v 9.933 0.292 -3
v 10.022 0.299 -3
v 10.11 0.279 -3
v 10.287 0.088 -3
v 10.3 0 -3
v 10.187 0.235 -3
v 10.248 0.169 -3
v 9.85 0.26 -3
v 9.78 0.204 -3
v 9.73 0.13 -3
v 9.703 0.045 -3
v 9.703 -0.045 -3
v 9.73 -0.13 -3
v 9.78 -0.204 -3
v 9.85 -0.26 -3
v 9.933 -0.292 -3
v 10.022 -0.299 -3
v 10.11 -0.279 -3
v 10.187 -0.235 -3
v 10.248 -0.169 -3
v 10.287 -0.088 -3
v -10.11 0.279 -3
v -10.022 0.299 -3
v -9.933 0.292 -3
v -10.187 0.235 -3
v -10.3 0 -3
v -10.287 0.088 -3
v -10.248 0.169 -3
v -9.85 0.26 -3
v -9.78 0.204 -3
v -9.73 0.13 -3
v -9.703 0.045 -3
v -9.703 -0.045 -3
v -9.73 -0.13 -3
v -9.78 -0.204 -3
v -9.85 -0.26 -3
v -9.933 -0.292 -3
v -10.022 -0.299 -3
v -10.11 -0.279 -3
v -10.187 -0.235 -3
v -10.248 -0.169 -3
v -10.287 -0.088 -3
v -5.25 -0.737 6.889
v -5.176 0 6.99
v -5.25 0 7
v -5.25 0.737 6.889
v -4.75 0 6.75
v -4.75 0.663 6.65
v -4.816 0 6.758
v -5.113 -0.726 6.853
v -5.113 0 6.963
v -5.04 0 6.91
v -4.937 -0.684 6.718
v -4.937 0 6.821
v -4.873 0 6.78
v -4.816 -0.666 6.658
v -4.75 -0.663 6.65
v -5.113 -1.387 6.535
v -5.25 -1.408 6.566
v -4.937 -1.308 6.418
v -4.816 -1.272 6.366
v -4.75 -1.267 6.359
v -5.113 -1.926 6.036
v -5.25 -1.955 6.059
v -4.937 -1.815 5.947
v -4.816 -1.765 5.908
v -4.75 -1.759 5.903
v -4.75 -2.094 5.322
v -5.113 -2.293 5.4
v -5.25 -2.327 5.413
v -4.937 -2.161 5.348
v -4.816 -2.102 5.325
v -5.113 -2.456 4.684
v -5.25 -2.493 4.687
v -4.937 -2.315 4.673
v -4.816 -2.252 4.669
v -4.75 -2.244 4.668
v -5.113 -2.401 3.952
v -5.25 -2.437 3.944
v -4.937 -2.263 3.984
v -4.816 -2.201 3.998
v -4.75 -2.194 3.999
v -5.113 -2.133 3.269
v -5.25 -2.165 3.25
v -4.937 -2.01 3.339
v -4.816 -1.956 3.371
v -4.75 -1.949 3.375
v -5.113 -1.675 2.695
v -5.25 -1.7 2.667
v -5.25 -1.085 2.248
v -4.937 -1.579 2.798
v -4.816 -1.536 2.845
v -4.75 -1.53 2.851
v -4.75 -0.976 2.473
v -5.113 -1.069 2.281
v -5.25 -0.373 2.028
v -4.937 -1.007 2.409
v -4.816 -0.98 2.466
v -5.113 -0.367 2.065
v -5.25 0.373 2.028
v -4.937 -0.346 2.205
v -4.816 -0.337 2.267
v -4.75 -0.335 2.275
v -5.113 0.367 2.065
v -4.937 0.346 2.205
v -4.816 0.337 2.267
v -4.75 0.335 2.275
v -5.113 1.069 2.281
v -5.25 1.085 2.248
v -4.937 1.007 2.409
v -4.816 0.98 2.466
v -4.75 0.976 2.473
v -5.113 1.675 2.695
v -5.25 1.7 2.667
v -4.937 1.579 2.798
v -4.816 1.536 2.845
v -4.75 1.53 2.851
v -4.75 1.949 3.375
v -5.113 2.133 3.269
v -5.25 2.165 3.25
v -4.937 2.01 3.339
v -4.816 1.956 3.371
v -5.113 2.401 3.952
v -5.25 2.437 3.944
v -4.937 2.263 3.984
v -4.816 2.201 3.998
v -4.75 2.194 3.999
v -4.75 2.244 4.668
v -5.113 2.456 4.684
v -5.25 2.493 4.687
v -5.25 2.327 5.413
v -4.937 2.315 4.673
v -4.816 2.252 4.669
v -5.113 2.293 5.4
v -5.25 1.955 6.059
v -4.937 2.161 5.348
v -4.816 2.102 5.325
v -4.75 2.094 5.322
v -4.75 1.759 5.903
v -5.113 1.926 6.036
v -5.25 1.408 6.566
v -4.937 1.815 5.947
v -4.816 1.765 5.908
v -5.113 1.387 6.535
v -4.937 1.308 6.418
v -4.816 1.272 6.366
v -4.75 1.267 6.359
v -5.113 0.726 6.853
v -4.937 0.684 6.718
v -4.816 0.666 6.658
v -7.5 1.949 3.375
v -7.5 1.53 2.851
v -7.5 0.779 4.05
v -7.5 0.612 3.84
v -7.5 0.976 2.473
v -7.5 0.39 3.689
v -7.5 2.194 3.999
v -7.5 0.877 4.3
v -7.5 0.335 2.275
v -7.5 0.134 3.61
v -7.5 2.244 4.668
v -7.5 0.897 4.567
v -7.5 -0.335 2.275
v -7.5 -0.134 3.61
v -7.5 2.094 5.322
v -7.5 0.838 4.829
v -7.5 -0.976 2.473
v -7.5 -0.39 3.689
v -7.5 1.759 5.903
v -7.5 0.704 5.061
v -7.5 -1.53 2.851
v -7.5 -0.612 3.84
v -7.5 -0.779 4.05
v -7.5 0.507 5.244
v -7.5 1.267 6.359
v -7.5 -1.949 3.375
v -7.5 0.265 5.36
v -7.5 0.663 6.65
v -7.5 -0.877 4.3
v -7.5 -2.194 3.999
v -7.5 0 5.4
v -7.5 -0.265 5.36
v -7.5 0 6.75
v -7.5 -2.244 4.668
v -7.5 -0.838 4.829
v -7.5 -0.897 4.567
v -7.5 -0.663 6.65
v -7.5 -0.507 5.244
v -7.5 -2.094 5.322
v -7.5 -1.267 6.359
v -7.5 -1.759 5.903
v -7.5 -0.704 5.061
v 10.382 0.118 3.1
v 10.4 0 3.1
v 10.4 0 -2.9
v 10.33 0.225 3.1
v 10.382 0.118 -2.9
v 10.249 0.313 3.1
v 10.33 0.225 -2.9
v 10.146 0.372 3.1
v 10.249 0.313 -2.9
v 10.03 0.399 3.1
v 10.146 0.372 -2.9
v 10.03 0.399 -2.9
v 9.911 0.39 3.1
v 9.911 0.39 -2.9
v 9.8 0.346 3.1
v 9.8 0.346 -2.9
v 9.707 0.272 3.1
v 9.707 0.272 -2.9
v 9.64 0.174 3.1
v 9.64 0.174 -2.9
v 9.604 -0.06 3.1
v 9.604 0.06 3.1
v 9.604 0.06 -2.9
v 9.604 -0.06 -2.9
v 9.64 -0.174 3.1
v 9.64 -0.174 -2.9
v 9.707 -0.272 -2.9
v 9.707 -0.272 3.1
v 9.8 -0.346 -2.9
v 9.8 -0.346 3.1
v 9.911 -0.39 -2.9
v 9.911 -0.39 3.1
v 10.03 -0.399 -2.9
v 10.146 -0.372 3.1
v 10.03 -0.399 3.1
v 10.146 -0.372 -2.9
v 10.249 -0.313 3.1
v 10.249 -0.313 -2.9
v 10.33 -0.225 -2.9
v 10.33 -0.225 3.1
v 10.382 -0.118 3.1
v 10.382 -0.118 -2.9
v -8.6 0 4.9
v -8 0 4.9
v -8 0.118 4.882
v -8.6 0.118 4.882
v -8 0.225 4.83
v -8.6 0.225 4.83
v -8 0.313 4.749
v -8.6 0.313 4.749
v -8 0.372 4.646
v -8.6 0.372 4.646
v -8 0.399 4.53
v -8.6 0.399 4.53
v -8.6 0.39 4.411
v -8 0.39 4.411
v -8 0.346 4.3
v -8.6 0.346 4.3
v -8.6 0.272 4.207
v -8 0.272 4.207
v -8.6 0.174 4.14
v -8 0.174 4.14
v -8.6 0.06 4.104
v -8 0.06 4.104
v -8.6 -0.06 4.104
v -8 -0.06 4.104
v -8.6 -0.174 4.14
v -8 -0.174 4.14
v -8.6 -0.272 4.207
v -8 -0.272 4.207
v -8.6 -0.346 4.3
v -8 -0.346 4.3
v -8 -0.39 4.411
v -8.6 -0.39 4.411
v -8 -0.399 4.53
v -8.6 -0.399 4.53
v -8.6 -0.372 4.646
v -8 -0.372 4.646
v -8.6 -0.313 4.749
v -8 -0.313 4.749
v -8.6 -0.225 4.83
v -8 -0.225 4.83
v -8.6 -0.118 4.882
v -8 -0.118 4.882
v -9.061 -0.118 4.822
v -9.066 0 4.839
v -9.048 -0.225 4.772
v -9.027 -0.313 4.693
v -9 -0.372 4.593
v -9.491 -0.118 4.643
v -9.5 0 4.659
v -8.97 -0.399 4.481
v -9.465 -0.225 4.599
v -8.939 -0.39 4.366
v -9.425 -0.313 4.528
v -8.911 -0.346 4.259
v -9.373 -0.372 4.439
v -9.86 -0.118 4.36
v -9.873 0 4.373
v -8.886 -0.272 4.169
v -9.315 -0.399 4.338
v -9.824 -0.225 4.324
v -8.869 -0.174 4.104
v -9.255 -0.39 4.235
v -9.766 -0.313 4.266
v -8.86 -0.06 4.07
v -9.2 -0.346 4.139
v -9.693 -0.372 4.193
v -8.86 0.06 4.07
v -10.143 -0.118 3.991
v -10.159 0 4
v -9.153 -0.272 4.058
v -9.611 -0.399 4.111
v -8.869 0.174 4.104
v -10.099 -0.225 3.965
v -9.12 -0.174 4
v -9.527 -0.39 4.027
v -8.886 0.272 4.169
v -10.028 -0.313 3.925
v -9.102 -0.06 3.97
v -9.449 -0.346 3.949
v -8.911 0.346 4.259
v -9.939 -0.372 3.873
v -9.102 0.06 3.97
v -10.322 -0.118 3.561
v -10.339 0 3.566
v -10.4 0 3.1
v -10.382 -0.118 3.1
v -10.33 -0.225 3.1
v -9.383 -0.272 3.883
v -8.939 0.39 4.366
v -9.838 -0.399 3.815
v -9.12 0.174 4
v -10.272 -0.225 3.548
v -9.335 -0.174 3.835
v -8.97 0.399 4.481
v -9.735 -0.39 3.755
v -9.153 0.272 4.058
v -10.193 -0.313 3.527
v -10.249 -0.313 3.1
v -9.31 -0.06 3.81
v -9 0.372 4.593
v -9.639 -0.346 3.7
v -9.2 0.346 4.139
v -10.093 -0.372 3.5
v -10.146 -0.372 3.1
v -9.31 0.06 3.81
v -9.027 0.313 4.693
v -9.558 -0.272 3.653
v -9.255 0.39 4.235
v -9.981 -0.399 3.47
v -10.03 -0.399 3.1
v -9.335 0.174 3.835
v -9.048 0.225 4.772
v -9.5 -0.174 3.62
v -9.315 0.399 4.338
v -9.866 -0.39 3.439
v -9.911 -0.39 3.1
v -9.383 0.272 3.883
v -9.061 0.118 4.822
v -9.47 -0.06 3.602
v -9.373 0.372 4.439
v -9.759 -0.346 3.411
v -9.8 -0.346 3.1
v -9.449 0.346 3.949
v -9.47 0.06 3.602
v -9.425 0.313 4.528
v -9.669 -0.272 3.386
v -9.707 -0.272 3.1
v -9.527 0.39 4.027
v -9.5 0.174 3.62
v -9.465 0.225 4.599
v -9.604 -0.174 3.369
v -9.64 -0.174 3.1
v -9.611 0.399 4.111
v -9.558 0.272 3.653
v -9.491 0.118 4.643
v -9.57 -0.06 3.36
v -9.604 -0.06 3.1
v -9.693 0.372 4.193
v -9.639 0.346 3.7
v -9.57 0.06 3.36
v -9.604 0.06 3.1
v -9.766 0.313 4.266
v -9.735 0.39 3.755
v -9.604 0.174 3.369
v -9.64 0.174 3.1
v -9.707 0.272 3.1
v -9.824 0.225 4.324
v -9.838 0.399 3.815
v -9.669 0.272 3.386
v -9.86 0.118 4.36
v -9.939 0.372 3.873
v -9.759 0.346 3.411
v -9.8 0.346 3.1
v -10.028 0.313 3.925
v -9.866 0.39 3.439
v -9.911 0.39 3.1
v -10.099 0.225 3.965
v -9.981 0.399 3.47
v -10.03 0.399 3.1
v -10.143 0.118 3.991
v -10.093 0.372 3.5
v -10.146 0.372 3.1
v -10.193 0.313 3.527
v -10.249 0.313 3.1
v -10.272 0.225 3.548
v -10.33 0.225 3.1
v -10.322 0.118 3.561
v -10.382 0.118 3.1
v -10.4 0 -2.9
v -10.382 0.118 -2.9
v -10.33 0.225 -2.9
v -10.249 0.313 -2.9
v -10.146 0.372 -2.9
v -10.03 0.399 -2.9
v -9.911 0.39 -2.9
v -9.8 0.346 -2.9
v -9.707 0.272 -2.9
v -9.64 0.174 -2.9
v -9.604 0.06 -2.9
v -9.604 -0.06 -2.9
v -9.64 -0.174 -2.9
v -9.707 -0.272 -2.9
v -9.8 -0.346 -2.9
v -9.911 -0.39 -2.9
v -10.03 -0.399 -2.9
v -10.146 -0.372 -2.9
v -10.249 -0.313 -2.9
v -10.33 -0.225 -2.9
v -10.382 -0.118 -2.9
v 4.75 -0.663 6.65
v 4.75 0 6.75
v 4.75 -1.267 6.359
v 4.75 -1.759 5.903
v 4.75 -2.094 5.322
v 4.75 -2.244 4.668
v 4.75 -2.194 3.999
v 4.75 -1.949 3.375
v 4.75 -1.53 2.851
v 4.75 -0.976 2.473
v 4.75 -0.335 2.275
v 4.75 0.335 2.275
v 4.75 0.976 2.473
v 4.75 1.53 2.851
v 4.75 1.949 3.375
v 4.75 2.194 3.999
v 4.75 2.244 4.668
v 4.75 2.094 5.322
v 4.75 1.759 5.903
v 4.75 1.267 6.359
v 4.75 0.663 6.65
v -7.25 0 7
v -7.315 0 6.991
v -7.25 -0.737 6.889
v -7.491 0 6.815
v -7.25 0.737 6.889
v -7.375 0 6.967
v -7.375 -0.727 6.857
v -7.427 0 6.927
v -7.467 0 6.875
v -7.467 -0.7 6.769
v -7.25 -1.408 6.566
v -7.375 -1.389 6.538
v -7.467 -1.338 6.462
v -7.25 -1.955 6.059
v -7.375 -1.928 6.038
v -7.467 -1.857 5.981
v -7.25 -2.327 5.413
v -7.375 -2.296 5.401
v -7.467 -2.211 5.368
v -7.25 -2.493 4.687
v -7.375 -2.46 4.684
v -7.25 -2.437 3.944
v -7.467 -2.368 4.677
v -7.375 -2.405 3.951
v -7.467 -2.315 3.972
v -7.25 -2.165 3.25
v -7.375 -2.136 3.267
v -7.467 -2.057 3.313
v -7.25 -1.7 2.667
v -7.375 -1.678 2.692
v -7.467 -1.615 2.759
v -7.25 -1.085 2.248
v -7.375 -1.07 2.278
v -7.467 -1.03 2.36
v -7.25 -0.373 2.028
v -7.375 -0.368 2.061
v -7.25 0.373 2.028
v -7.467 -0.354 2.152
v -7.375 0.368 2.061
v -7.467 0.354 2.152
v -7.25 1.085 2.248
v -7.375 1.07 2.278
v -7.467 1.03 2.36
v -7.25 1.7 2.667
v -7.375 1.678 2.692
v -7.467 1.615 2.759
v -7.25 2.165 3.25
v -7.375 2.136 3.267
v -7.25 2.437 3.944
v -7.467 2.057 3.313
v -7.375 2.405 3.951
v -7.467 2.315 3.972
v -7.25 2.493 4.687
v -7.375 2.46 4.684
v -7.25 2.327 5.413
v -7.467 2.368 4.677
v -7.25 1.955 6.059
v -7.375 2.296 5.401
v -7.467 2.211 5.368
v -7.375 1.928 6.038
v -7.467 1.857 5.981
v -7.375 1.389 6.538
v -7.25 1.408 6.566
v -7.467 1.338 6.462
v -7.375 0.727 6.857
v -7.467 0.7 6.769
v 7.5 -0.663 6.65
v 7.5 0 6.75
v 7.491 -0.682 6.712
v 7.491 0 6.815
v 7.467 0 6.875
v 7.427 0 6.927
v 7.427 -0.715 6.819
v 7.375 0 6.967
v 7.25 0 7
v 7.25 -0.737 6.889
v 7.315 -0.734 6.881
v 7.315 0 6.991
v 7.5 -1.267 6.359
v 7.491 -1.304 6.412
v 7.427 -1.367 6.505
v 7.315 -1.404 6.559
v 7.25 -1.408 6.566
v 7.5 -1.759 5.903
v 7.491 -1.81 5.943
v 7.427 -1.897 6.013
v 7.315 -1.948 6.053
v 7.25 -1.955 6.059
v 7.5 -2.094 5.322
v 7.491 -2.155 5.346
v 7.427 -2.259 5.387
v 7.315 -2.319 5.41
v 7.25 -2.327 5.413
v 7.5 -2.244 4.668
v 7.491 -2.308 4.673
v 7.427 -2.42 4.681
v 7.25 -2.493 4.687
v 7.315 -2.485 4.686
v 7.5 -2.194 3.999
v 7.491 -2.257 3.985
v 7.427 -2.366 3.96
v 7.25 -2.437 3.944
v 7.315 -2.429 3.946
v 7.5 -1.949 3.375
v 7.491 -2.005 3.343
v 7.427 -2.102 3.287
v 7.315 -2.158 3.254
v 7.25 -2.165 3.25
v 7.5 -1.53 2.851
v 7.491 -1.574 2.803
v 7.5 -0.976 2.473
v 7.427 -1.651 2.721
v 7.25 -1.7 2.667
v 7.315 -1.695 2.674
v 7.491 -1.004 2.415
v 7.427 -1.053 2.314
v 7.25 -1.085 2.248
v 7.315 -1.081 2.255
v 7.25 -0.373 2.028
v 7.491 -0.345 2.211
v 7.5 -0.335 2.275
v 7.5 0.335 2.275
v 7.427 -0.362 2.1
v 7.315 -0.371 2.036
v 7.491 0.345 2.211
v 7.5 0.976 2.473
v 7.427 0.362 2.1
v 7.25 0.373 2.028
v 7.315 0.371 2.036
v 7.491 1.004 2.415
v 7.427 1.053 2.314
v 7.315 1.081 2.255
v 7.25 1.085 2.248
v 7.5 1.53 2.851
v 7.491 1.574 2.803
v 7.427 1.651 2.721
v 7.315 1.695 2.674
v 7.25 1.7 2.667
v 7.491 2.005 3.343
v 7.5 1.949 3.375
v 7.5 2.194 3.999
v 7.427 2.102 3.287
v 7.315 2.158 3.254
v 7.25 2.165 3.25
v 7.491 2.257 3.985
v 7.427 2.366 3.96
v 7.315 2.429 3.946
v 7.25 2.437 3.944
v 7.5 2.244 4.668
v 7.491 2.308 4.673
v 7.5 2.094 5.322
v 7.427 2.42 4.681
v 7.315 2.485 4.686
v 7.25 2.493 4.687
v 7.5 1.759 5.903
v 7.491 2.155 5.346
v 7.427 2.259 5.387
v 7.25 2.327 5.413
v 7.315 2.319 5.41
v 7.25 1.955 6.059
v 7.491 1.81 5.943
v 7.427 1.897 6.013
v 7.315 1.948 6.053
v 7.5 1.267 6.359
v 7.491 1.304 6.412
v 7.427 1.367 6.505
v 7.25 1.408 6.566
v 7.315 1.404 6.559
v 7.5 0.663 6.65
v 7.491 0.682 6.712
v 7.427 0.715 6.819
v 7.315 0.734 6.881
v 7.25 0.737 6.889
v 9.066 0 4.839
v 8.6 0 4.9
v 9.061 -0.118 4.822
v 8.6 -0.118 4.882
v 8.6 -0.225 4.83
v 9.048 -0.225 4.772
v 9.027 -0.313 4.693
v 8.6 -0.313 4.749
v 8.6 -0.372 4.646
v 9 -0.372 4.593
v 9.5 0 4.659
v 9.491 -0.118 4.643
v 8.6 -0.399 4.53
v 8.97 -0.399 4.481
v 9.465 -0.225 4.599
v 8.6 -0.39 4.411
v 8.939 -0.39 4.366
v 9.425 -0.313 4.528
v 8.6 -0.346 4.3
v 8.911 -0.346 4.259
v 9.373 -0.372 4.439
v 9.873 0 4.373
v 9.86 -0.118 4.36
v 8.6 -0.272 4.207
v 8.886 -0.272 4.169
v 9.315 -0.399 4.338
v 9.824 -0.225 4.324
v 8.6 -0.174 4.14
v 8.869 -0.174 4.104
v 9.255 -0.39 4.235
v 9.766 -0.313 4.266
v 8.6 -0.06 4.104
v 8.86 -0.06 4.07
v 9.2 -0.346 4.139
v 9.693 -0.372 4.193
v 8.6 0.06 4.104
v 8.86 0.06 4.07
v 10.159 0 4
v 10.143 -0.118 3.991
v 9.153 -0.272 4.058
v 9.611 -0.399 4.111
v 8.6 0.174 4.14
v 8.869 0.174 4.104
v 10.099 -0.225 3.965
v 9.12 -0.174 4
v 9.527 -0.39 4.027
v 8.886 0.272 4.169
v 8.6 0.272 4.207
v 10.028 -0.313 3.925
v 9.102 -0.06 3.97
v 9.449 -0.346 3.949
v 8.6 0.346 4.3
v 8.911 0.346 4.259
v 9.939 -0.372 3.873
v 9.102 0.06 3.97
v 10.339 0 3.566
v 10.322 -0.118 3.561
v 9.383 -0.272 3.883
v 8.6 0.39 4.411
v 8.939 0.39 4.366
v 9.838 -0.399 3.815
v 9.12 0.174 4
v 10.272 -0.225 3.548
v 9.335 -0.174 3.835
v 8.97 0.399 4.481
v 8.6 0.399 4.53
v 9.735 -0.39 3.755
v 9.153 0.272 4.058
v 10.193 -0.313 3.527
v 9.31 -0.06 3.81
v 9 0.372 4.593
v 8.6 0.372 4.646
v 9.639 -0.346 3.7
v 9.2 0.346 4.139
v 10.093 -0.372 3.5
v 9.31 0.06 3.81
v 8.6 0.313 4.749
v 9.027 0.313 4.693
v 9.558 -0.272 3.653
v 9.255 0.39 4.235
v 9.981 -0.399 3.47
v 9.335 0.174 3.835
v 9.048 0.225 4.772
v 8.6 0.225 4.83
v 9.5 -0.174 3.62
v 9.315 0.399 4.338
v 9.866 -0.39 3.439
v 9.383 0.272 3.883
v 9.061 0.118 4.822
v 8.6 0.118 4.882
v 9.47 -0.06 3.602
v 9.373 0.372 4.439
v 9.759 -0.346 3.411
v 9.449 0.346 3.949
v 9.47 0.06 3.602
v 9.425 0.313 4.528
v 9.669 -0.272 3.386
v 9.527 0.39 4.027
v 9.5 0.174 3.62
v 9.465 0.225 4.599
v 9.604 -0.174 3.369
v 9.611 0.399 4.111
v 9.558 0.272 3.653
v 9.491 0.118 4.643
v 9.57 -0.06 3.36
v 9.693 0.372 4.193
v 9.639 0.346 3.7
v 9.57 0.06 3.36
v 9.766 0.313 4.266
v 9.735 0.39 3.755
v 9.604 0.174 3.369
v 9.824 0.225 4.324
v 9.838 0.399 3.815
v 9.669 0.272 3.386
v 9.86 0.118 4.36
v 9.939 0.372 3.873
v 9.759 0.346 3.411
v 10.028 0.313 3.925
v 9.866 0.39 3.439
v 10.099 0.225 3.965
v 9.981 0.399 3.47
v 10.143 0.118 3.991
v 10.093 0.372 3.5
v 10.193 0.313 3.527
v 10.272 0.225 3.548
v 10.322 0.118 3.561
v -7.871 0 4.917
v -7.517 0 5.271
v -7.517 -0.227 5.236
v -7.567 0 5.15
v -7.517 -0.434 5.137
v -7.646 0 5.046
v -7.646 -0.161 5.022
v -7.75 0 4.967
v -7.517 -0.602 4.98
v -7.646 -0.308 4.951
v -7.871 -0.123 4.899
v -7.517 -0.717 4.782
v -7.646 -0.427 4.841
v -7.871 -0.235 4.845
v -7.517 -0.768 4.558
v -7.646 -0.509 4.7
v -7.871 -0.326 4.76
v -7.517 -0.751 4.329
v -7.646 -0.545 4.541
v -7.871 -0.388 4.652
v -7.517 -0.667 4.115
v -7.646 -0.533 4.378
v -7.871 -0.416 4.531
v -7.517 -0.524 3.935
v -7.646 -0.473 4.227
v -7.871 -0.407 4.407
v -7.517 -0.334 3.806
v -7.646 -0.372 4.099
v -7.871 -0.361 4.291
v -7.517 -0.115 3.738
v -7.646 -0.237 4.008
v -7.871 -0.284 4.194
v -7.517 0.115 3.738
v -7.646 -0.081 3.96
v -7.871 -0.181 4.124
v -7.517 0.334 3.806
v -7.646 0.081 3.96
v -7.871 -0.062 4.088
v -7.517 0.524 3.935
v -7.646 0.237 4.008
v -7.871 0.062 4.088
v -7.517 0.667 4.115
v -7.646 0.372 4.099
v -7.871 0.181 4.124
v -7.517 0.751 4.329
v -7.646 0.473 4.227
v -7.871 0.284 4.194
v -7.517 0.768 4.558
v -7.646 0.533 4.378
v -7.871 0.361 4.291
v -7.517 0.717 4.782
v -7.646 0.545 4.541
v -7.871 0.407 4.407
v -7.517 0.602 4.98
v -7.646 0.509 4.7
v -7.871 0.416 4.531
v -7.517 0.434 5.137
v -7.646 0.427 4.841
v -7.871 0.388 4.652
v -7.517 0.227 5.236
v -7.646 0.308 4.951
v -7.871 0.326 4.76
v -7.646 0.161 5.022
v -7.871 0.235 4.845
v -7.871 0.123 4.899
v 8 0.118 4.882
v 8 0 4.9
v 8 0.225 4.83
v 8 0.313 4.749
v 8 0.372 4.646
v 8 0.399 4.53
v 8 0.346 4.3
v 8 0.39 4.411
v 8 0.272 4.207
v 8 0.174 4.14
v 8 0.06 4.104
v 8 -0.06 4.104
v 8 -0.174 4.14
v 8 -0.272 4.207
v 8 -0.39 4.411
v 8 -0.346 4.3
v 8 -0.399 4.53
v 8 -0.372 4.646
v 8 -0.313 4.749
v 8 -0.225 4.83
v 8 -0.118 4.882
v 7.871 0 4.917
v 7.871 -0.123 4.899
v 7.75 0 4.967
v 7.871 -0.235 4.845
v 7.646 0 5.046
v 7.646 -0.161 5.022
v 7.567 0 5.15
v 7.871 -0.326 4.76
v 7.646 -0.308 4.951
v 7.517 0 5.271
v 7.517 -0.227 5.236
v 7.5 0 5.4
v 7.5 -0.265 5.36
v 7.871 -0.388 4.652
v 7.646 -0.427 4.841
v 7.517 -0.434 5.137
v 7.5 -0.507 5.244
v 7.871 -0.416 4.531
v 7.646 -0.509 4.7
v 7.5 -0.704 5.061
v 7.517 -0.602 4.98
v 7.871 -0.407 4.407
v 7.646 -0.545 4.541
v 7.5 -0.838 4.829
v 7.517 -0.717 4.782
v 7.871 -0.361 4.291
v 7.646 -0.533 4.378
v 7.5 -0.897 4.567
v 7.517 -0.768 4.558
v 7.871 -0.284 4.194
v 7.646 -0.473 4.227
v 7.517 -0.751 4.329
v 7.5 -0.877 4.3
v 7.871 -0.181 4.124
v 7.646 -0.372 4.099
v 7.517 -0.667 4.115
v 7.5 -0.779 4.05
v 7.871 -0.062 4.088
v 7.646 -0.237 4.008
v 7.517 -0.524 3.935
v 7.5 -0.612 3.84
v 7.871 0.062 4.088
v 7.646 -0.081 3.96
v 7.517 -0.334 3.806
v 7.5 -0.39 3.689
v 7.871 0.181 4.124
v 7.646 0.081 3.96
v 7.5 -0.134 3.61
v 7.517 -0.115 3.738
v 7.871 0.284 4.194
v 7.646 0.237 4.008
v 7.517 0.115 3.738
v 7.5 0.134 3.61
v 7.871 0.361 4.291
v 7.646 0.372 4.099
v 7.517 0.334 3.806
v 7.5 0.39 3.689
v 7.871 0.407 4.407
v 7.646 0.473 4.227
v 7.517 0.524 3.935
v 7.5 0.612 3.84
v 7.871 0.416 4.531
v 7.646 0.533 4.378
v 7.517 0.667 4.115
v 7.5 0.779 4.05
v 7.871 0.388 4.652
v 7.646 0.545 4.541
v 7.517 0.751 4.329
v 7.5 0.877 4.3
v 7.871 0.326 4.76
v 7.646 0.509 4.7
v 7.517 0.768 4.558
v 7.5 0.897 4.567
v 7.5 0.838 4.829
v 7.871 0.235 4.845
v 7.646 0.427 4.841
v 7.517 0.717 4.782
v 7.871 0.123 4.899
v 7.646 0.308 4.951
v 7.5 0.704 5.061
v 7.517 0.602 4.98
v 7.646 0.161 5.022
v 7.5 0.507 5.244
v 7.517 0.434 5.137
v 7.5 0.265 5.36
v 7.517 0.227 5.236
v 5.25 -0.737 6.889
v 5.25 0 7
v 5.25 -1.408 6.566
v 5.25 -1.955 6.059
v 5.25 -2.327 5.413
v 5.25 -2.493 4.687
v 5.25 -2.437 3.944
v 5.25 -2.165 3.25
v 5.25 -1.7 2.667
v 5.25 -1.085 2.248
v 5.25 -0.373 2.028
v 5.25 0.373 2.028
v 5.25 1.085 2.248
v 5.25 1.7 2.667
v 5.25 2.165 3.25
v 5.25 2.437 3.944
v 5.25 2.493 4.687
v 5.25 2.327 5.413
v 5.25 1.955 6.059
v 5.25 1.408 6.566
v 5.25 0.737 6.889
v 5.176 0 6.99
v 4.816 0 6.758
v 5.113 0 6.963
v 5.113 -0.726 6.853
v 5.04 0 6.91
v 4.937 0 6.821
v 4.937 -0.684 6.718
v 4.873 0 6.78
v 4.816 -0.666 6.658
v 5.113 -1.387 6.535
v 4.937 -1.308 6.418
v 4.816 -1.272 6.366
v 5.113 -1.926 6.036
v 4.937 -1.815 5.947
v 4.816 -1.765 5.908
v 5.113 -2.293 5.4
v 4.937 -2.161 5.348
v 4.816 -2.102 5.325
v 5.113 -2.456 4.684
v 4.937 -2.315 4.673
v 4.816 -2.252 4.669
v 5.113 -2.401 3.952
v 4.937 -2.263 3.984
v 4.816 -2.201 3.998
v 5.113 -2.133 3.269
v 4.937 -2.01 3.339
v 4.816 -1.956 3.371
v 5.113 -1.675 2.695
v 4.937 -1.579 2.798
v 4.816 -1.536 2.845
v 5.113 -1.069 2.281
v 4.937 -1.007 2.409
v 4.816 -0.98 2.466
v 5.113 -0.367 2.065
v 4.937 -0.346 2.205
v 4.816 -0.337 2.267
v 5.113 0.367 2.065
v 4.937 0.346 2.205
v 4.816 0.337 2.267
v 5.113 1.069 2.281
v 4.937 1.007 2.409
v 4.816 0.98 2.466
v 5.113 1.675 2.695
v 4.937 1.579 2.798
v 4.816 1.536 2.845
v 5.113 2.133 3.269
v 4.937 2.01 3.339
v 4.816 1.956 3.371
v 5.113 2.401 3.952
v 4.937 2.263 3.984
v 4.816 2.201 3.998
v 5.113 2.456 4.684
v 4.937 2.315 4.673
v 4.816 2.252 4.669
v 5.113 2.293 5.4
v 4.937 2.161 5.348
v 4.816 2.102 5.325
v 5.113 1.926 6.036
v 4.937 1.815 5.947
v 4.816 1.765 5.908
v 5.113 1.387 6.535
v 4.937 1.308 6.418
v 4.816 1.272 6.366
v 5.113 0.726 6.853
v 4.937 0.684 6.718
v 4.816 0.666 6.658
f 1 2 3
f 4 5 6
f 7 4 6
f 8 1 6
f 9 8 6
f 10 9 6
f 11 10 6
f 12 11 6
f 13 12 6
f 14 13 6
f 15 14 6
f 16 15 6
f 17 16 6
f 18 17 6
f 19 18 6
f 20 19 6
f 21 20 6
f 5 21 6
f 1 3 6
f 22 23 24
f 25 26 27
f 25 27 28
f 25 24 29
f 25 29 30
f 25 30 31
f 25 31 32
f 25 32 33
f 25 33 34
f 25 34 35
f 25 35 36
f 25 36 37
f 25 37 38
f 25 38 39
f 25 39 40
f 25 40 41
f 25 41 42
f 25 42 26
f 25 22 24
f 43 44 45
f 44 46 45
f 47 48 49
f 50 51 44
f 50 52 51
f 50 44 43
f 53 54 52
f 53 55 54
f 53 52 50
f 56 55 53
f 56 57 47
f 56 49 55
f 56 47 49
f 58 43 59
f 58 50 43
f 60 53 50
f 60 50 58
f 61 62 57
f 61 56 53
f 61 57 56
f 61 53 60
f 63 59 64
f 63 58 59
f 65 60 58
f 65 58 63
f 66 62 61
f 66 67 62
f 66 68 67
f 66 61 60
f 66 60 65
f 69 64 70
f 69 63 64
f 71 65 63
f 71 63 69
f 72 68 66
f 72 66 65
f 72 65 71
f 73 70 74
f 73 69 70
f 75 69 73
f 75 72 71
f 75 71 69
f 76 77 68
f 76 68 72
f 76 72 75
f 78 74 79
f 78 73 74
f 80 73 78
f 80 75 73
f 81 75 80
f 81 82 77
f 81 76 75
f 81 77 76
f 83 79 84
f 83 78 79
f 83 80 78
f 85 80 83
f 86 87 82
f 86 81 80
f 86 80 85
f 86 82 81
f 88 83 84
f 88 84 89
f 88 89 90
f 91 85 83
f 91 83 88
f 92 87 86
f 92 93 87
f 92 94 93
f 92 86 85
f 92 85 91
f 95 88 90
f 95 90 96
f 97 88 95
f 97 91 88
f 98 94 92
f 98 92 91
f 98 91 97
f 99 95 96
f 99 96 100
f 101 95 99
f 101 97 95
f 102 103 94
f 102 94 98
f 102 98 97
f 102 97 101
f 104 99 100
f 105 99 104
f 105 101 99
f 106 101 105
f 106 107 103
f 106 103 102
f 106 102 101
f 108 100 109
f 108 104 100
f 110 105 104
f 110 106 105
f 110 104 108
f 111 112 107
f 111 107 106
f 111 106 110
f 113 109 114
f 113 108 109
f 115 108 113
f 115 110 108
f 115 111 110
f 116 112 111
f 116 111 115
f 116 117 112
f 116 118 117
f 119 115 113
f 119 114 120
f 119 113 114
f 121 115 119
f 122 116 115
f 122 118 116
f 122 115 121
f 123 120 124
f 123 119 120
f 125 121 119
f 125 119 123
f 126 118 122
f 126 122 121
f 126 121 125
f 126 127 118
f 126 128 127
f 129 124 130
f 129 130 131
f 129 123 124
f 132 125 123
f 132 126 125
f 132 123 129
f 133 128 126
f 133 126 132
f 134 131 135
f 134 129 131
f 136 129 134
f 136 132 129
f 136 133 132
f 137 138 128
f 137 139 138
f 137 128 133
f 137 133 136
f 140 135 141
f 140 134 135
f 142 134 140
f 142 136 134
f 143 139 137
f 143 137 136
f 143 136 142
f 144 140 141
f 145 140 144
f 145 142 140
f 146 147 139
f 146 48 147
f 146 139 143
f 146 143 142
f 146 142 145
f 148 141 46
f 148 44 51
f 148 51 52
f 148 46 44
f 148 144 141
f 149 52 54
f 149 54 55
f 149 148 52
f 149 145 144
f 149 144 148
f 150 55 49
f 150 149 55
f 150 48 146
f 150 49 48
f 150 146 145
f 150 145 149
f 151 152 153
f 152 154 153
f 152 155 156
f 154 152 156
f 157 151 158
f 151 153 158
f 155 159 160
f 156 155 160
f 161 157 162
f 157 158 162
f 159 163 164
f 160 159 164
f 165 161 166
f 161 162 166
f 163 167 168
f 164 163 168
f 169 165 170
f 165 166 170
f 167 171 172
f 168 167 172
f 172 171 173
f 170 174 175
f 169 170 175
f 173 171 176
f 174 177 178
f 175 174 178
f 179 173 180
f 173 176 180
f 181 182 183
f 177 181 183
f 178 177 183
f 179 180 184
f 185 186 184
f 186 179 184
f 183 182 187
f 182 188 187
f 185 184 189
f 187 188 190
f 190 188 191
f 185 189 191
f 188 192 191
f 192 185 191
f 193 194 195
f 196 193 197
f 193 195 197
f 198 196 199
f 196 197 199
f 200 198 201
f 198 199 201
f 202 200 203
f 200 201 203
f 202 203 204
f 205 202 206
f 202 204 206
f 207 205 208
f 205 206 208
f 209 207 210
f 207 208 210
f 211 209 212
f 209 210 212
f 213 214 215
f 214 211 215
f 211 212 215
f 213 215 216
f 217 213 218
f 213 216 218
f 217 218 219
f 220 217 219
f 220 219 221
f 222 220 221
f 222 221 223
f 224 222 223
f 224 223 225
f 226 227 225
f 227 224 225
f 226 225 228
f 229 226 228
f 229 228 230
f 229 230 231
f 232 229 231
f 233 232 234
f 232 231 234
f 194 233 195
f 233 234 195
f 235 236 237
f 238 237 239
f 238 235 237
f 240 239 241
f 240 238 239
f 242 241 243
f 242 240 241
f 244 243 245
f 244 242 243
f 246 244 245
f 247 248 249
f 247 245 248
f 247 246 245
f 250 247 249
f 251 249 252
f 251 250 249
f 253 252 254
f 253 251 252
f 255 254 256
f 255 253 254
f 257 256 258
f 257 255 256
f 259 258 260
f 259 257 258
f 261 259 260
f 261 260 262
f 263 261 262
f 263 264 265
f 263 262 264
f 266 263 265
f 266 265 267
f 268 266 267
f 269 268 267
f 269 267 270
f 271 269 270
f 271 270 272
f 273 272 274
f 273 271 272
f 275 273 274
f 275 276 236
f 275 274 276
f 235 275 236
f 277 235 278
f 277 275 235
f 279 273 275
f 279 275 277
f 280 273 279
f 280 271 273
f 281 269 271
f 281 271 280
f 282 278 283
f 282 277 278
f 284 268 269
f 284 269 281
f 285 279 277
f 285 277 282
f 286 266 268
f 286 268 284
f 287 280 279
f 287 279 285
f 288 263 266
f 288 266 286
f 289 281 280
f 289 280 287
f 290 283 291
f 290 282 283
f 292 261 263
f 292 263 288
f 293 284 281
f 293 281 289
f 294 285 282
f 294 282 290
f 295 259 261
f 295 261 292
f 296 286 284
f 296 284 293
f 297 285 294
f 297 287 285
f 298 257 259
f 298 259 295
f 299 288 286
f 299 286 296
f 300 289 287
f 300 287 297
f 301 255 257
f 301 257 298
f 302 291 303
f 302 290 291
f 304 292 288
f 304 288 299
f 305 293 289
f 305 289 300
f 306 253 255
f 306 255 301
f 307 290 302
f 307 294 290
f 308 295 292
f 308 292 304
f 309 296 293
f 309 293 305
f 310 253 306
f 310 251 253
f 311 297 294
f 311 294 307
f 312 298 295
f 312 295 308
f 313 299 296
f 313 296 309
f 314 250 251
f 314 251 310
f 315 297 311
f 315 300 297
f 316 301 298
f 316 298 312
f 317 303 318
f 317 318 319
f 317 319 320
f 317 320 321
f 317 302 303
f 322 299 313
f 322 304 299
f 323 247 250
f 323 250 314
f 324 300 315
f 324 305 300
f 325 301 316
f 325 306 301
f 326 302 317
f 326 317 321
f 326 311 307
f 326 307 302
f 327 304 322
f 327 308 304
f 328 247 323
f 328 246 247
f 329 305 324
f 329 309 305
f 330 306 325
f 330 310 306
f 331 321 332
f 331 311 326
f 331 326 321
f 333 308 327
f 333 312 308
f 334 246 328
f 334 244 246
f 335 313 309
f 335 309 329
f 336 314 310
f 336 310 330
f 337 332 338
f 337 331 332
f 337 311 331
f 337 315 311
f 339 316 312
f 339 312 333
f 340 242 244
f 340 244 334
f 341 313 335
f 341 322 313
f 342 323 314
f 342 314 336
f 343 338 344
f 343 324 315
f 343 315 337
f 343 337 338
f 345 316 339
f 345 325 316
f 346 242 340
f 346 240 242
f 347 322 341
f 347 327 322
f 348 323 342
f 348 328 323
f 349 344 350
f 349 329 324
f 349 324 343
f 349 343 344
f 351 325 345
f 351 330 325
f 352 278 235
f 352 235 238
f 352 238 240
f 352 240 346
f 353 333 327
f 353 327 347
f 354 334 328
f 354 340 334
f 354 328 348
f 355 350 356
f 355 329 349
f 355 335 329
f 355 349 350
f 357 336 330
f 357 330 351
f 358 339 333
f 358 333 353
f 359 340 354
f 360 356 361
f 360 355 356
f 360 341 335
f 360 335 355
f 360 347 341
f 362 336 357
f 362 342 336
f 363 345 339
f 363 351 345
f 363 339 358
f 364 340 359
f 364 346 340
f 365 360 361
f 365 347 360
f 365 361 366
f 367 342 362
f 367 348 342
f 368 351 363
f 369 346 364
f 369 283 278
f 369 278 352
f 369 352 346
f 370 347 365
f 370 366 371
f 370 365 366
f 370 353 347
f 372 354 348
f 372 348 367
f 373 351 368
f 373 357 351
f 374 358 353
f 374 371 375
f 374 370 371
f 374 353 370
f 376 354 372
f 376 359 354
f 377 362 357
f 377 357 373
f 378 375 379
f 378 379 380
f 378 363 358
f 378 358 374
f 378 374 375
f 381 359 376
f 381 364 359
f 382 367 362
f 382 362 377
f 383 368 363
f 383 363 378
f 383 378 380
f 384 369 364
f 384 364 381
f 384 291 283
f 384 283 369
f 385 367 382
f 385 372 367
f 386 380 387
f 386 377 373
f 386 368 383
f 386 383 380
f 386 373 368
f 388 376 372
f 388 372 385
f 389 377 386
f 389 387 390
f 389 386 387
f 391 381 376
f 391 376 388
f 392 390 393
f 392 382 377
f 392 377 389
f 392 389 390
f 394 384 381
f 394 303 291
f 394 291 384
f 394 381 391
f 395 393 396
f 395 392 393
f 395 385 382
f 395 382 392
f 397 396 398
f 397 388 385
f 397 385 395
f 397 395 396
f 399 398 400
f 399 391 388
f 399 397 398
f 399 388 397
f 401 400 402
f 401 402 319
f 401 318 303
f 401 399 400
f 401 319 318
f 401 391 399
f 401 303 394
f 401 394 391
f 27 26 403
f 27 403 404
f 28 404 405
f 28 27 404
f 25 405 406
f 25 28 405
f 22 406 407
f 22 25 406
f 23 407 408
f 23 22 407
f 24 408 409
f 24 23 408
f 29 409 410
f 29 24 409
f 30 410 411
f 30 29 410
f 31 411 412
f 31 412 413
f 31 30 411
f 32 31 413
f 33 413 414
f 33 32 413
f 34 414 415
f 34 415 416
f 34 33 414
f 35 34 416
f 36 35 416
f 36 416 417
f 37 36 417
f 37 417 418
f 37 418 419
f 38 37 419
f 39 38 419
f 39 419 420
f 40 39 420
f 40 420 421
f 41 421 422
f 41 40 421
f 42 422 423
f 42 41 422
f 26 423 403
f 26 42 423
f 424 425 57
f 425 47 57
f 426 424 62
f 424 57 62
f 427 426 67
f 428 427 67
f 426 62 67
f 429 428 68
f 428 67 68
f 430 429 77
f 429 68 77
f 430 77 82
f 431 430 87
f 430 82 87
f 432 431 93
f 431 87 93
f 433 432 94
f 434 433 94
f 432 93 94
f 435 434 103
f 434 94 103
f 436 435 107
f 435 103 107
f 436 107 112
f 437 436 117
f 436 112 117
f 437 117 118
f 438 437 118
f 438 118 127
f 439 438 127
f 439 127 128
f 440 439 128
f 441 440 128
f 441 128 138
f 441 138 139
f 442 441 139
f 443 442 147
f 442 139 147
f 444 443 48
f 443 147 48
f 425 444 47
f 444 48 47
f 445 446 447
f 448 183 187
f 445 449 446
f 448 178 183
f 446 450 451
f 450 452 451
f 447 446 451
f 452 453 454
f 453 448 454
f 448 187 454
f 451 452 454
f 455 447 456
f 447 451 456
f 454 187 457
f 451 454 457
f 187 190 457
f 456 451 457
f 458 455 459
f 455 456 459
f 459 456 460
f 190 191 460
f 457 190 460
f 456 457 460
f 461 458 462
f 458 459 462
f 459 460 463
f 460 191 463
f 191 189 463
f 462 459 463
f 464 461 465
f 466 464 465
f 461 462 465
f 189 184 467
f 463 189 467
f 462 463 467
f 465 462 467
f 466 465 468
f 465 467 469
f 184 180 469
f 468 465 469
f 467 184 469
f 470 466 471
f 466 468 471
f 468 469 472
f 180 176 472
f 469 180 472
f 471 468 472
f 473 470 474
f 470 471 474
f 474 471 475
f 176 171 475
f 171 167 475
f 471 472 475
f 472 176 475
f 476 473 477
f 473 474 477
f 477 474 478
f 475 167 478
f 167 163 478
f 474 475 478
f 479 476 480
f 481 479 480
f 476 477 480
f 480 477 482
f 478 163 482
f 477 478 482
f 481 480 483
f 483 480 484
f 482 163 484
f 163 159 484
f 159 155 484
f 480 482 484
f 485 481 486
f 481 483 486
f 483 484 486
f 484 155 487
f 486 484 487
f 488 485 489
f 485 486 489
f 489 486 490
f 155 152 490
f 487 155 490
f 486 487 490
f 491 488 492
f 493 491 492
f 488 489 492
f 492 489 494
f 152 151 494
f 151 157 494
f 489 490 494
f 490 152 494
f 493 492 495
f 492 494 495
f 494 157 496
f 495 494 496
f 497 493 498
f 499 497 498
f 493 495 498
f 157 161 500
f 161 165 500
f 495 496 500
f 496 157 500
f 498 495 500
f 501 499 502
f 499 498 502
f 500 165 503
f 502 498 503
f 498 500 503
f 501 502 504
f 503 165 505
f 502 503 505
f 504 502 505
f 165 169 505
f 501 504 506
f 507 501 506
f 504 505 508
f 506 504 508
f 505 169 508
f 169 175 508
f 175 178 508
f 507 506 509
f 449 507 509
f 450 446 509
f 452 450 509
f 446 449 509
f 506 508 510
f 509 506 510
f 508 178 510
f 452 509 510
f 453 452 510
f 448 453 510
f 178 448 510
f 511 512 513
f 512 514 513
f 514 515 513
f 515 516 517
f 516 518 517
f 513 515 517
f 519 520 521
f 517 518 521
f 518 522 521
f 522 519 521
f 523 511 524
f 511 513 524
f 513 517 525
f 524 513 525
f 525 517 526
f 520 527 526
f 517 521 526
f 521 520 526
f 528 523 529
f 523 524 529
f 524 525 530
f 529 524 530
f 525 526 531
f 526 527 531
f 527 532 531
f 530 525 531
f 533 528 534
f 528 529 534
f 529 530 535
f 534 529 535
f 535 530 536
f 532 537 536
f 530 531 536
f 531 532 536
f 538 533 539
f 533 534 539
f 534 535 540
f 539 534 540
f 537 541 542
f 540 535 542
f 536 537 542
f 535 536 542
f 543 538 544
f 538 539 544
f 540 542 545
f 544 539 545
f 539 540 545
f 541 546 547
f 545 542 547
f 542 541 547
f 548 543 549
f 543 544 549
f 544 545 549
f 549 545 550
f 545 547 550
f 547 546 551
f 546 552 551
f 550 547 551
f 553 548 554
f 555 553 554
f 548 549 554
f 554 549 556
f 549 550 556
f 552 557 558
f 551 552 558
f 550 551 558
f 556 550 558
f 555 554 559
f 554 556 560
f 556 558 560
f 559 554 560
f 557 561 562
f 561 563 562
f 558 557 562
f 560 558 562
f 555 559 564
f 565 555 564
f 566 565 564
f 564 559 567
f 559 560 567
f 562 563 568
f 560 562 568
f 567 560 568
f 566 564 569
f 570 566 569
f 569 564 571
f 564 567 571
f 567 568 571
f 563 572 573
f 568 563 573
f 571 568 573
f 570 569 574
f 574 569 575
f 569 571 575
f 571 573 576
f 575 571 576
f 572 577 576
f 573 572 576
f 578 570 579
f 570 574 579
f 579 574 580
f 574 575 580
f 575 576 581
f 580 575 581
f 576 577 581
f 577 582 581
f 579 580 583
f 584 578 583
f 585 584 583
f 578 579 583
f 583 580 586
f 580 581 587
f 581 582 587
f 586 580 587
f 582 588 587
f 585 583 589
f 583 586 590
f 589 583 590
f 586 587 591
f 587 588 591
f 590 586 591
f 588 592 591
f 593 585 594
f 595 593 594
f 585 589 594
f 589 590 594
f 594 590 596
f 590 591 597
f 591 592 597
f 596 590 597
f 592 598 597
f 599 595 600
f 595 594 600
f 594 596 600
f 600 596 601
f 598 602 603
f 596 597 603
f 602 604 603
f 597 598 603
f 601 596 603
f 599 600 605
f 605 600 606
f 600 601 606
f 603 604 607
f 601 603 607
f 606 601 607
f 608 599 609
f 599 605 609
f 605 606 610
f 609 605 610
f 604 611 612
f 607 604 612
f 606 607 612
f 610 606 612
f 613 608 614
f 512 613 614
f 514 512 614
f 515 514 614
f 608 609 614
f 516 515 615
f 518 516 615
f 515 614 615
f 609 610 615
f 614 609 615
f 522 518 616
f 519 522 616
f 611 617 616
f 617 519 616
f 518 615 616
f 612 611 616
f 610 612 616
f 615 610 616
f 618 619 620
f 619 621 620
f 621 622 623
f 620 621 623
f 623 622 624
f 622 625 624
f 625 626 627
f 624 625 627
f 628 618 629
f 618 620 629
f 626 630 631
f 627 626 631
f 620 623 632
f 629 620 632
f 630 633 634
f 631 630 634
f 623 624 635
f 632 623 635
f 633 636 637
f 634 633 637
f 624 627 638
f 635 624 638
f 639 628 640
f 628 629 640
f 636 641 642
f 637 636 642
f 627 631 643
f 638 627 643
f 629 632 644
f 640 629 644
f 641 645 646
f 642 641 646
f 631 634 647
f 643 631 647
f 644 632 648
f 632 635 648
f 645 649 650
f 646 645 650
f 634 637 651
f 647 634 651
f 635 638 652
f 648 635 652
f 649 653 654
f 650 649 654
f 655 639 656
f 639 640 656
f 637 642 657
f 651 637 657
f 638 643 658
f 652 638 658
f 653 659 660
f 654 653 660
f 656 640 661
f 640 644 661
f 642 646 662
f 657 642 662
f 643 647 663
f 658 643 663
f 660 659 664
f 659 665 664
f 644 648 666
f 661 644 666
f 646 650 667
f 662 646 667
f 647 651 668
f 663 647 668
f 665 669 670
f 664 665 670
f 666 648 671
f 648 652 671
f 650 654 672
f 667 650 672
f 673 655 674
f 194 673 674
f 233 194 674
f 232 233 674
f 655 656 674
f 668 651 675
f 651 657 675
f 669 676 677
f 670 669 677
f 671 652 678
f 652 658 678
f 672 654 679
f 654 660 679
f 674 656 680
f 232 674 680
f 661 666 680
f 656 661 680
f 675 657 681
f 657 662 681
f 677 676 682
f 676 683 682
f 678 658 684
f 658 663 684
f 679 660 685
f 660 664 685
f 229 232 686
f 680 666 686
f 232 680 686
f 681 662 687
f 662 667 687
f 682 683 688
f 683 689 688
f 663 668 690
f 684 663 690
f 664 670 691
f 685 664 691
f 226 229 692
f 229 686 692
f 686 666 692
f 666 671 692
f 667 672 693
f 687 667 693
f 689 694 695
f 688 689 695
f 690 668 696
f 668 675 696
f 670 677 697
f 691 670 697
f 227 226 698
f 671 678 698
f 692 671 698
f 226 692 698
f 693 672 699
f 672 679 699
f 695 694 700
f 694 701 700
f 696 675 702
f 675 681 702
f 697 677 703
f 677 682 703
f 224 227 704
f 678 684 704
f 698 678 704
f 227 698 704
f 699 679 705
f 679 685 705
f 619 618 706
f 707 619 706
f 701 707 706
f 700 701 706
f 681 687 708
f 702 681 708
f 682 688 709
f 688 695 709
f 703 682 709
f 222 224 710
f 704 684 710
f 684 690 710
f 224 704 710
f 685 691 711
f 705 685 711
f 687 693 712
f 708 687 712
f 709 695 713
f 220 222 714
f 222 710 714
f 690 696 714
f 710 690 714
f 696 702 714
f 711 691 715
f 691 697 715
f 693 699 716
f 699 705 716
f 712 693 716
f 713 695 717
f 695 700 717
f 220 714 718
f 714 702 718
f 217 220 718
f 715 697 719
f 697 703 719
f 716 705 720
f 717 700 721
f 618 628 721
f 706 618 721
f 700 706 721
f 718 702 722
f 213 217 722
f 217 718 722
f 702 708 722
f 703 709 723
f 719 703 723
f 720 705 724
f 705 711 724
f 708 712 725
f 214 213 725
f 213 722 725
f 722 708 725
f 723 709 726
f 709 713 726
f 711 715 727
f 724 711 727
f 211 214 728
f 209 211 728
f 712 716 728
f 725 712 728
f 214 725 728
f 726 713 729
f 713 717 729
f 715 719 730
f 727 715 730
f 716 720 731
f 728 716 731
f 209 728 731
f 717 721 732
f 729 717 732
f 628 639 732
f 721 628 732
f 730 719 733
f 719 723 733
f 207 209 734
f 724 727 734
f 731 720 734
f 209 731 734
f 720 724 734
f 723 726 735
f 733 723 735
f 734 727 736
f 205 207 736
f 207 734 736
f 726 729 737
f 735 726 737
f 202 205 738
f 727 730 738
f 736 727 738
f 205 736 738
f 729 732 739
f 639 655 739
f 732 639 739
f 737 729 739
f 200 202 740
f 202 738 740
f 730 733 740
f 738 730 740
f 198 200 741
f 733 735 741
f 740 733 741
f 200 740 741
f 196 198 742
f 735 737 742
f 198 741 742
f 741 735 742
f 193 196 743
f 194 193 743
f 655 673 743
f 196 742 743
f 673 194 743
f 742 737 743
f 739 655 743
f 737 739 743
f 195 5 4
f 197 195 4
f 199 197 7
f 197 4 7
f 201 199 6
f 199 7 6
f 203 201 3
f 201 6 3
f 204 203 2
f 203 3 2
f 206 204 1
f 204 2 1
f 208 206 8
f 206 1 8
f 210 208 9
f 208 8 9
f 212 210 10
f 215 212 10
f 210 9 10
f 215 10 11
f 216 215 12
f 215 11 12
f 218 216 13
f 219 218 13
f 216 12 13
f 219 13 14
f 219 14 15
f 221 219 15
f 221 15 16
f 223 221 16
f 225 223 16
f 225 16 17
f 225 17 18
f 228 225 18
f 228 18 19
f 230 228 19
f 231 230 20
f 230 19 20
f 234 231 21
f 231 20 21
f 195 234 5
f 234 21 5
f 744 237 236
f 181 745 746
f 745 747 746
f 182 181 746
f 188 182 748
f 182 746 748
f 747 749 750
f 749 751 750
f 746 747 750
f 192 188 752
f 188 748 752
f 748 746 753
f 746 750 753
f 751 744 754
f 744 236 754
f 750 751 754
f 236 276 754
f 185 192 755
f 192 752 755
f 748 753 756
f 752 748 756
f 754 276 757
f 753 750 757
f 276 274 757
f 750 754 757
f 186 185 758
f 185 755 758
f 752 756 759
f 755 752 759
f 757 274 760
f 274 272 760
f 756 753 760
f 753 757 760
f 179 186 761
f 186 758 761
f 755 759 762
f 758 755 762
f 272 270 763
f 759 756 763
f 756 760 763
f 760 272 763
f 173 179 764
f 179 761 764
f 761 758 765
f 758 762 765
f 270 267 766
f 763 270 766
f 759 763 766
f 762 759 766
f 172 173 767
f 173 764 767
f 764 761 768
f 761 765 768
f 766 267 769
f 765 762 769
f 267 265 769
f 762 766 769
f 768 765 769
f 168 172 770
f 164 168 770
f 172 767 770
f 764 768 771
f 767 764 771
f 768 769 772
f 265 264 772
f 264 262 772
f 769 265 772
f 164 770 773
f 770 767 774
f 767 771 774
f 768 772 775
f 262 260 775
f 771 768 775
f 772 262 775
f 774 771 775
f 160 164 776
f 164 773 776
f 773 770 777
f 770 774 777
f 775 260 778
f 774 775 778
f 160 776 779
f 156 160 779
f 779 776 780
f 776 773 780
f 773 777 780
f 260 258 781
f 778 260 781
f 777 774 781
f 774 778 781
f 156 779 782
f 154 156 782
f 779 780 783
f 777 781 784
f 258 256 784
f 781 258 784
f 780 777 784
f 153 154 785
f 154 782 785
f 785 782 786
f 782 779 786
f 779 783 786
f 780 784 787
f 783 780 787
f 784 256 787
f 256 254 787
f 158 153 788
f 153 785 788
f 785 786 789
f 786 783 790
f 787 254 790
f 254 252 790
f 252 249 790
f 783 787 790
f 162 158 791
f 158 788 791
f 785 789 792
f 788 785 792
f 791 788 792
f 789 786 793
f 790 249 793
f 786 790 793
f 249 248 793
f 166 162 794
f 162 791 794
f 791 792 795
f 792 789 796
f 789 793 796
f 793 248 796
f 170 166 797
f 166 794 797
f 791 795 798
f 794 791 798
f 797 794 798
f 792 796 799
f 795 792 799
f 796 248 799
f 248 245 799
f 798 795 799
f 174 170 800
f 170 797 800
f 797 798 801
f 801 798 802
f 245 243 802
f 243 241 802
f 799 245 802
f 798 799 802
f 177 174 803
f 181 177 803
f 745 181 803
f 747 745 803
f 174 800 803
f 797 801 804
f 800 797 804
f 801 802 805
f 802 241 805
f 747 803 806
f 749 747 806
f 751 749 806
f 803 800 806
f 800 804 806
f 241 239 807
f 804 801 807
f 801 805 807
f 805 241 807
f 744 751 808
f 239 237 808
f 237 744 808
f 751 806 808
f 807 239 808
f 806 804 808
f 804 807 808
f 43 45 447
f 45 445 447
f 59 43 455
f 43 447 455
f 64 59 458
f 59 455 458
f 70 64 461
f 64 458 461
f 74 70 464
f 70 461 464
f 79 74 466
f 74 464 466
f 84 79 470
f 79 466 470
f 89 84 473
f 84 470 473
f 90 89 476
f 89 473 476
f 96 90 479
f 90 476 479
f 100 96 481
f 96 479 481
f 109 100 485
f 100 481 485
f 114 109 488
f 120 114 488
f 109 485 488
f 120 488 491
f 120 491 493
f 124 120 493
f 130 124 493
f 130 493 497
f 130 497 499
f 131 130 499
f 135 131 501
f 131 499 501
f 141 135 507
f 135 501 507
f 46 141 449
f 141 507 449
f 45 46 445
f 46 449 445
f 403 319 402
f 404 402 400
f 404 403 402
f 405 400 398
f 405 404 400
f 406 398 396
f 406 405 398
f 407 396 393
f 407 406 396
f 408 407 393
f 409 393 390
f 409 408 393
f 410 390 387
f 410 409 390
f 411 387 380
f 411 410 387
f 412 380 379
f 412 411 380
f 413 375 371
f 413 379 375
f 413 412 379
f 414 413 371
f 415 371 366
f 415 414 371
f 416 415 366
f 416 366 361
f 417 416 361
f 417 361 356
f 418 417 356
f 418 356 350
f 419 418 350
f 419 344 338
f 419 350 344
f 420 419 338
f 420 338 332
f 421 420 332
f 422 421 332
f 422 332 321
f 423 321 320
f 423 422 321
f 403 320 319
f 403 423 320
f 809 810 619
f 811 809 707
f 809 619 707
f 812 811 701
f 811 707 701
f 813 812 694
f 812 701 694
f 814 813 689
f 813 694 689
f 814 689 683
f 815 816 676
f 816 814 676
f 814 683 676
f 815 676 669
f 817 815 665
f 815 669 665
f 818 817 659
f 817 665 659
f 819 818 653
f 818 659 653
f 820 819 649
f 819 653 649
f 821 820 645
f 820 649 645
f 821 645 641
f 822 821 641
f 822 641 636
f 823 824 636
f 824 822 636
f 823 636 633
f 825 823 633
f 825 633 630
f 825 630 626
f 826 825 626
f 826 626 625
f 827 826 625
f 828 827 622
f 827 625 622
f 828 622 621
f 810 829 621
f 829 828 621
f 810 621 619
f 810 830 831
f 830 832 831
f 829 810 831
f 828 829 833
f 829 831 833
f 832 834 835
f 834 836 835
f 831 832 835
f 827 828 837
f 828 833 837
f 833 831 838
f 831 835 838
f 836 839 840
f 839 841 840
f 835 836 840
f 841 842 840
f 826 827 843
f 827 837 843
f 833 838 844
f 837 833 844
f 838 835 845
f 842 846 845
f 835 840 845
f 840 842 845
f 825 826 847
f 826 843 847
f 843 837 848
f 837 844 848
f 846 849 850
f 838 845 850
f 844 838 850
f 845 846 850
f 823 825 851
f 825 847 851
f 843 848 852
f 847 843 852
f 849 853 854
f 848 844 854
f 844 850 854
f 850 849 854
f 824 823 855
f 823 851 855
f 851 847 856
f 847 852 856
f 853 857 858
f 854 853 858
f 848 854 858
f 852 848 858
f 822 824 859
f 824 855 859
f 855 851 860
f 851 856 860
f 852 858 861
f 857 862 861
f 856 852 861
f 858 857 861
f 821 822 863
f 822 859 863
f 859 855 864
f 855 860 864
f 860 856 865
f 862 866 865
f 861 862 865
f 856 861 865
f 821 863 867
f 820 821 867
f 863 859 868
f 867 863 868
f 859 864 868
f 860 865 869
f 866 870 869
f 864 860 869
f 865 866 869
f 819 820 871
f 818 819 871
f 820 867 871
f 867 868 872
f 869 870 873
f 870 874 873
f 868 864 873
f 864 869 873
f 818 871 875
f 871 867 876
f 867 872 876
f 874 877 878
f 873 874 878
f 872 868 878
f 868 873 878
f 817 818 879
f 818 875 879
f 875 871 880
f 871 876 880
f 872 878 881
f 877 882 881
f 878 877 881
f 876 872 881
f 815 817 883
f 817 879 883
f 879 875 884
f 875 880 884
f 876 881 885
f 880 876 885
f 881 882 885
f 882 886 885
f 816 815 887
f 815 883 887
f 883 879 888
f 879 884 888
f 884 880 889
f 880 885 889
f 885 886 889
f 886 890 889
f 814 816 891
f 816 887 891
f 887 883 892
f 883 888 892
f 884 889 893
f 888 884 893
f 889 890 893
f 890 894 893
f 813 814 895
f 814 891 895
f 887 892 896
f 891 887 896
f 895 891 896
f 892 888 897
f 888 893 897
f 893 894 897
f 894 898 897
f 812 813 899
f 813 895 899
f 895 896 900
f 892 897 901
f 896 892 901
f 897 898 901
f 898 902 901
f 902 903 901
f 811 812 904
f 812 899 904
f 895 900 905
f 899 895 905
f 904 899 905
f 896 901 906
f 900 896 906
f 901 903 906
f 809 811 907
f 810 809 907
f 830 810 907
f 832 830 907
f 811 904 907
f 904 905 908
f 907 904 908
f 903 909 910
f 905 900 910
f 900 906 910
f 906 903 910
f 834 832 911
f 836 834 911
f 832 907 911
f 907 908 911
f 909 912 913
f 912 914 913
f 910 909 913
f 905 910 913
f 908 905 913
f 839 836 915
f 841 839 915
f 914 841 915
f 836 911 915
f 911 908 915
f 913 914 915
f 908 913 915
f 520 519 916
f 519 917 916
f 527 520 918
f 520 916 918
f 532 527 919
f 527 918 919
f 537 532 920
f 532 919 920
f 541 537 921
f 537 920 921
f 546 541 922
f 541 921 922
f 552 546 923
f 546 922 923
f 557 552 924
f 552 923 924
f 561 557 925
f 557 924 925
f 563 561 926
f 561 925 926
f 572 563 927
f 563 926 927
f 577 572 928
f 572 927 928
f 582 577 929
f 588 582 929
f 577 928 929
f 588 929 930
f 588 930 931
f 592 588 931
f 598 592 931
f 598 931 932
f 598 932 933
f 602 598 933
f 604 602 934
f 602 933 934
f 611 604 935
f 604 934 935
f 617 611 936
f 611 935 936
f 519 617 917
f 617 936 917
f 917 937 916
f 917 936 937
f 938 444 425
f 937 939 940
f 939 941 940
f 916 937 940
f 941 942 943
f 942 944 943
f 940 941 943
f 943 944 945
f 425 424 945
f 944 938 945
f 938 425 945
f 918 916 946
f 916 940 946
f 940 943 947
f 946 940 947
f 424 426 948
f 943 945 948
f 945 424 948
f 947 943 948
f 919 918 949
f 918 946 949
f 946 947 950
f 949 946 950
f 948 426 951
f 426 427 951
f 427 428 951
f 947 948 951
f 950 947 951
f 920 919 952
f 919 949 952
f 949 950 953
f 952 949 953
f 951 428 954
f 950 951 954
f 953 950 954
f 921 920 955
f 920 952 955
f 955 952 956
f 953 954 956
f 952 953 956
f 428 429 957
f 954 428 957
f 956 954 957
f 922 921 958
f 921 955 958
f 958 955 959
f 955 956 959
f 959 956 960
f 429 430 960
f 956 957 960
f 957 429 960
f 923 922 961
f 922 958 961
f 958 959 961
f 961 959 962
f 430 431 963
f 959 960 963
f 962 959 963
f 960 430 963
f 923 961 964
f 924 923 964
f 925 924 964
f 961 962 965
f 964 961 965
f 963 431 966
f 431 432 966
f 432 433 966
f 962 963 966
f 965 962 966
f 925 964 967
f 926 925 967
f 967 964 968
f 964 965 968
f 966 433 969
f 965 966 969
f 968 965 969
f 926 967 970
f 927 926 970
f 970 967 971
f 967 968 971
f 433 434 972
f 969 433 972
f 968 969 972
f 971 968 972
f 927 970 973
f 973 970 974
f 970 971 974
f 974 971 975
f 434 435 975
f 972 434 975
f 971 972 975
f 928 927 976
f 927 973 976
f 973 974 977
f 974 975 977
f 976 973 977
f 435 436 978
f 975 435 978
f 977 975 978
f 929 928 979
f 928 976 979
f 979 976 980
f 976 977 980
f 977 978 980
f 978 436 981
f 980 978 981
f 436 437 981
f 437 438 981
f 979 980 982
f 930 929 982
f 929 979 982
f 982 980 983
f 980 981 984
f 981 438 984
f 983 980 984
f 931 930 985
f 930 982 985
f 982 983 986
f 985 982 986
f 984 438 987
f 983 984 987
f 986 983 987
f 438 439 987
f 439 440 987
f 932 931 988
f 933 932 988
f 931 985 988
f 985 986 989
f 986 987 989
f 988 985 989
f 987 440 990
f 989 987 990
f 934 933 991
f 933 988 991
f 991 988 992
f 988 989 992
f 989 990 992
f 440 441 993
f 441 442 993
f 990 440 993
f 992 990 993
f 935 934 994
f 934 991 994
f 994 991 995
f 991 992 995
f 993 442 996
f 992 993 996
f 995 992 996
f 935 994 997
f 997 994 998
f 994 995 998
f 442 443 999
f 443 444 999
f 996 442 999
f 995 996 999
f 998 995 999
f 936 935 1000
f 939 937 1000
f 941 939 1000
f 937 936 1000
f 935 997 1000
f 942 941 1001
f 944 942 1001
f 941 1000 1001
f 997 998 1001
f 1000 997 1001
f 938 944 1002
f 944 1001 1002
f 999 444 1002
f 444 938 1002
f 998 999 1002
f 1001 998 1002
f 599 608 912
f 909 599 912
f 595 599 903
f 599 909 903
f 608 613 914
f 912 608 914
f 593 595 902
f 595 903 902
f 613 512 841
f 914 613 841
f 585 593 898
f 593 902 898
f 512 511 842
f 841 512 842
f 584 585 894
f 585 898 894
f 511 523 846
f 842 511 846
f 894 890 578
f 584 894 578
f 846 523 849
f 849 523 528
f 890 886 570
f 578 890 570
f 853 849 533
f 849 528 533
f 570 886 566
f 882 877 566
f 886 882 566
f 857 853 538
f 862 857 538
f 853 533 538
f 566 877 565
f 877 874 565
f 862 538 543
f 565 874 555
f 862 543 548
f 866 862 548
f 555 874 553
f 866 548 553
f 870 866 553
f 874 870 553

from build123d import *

# Parameters (mm, degrees)
SKETCH_3_R                 = 0.4
CHAMFER_1_SIZE             = 0.1
CHAMFER_1_OF_MIRROR_1_SIZE = 0.1


with BuildPart() as part:
    # Эскиз1 → Повернуть1 (revolve)
    with BuildSketch(Plane(origin=(0, 0, 0), x_dir=(1, 0, 0), z_dir=(0, 1, 0)), mode=Mode.PRIVATE) as revolve_1_sk:
        with BuildLine():
            Line((-8, -4.5), (8, -4.5))
            Line((8, -4.5), (8, -4.1))
            ThreePointArc((8, -4.1), (7.646446609, -3.953553391), (7.5, -3.6))
            Line((7.5, -3.6), (7.5, -2.25))
            ThreePointArc((7.5, -2.25), (7.426776695, -2.073223305), (7.25, -2))
            Line((7.25, -2), (5.25, -2))
            add(Edge.make_bspline(
                [(5.25, -2), (5.138483771, -2), (5.001208755, -2.125), (4.859098719, -2.25), (4.75, -2.25)],
                knots=[0, 0, 0, 0, 0.5, 1, 1, 1, 1], degree=3))
            Line((4.75, -2.25), (-4.75, -2.25))
            add(Edge.make_bspline(
                [(-5.25, -2), (-5.138483771, -2), (-5.001208755, -2.125), (-4.859098719, -2.25), (-4.75, -2.25)],
                knots=[0, 0, 0, 0, 0.5, 1, 1, 1, 1], degree=3))
            Line((-5.25, -2), (-7.25, -2))
            ThreePointArc((-7.25, -2), (-7.426776695, -2.073223305), (-7.5, -2.25))
            Line((-7.5, -2.25), (-7.5, -3.6))
            ThreePointArc((-7.5, -3.6), (-7.646446609, -3.953553391), (-8, -4.1))
            Line((-8, -4.1), (-8, -4.5))
        make_face()
    revolve(revolve_1_sk.sketch.rotate(Axis((-11.456266602, 0, 4.5), (1, 0, 0)), 180), axis=Axis((-11.456266602, 0, 4.5), (1, 0, 0)))

    # По траектории1: sweep along a path in Эскиз2
    with BuildLine(Plane(origin=(0, 0, 0), x_dir=(1, 0, 0), z_dir=(0, 1, 0))) as sweep_1_path:
        Line((-8, -4.5), (-8.6, -4.5))
        ThreePointArc((-8.6, -4.5), (-9.589949494, -4.089949494), (-10, -3.1))
        Line((-10, -3.1), (-10, 3))
    # Эскиз3 → По траектории1 (sweep)
    with BuildSketch(Plane.ZY.offset(8)):
        with Locations((4.5, 0)):
            Circle(SKETCH_3_R)
    sweep_1 = sweep(path=sweep_1_path.line)

    # Фаска1
    chamfer_1_edges = [part.edges().sort_by_distance(p)[0] for p in [
        (-9.6, 0, -3),
    ]]
    chamfer(chamfer_1_edges, length=CHAMFER_1_SIZE)

    # Зеркальное отражение1: По траектории1 across plane
    add(sweep_1.mirror(Plane(origin=(0, 0, 0), x_dir=(0, 0, 1), z_dir=(1, 0, 0))))

    # Фаска1 of Зеркальное отражение1
    chamfer_1_of_mirror_1_edges = [part.edges().sort_by_distance(p)[0] for p in [
        (9.6, 0, -3),
    ]]
    chamfer(chamfer_1_of_mirror_1_edges, length=CHAMFER_1_OF_MIRROR_1_SIZE)


solid = part.part
